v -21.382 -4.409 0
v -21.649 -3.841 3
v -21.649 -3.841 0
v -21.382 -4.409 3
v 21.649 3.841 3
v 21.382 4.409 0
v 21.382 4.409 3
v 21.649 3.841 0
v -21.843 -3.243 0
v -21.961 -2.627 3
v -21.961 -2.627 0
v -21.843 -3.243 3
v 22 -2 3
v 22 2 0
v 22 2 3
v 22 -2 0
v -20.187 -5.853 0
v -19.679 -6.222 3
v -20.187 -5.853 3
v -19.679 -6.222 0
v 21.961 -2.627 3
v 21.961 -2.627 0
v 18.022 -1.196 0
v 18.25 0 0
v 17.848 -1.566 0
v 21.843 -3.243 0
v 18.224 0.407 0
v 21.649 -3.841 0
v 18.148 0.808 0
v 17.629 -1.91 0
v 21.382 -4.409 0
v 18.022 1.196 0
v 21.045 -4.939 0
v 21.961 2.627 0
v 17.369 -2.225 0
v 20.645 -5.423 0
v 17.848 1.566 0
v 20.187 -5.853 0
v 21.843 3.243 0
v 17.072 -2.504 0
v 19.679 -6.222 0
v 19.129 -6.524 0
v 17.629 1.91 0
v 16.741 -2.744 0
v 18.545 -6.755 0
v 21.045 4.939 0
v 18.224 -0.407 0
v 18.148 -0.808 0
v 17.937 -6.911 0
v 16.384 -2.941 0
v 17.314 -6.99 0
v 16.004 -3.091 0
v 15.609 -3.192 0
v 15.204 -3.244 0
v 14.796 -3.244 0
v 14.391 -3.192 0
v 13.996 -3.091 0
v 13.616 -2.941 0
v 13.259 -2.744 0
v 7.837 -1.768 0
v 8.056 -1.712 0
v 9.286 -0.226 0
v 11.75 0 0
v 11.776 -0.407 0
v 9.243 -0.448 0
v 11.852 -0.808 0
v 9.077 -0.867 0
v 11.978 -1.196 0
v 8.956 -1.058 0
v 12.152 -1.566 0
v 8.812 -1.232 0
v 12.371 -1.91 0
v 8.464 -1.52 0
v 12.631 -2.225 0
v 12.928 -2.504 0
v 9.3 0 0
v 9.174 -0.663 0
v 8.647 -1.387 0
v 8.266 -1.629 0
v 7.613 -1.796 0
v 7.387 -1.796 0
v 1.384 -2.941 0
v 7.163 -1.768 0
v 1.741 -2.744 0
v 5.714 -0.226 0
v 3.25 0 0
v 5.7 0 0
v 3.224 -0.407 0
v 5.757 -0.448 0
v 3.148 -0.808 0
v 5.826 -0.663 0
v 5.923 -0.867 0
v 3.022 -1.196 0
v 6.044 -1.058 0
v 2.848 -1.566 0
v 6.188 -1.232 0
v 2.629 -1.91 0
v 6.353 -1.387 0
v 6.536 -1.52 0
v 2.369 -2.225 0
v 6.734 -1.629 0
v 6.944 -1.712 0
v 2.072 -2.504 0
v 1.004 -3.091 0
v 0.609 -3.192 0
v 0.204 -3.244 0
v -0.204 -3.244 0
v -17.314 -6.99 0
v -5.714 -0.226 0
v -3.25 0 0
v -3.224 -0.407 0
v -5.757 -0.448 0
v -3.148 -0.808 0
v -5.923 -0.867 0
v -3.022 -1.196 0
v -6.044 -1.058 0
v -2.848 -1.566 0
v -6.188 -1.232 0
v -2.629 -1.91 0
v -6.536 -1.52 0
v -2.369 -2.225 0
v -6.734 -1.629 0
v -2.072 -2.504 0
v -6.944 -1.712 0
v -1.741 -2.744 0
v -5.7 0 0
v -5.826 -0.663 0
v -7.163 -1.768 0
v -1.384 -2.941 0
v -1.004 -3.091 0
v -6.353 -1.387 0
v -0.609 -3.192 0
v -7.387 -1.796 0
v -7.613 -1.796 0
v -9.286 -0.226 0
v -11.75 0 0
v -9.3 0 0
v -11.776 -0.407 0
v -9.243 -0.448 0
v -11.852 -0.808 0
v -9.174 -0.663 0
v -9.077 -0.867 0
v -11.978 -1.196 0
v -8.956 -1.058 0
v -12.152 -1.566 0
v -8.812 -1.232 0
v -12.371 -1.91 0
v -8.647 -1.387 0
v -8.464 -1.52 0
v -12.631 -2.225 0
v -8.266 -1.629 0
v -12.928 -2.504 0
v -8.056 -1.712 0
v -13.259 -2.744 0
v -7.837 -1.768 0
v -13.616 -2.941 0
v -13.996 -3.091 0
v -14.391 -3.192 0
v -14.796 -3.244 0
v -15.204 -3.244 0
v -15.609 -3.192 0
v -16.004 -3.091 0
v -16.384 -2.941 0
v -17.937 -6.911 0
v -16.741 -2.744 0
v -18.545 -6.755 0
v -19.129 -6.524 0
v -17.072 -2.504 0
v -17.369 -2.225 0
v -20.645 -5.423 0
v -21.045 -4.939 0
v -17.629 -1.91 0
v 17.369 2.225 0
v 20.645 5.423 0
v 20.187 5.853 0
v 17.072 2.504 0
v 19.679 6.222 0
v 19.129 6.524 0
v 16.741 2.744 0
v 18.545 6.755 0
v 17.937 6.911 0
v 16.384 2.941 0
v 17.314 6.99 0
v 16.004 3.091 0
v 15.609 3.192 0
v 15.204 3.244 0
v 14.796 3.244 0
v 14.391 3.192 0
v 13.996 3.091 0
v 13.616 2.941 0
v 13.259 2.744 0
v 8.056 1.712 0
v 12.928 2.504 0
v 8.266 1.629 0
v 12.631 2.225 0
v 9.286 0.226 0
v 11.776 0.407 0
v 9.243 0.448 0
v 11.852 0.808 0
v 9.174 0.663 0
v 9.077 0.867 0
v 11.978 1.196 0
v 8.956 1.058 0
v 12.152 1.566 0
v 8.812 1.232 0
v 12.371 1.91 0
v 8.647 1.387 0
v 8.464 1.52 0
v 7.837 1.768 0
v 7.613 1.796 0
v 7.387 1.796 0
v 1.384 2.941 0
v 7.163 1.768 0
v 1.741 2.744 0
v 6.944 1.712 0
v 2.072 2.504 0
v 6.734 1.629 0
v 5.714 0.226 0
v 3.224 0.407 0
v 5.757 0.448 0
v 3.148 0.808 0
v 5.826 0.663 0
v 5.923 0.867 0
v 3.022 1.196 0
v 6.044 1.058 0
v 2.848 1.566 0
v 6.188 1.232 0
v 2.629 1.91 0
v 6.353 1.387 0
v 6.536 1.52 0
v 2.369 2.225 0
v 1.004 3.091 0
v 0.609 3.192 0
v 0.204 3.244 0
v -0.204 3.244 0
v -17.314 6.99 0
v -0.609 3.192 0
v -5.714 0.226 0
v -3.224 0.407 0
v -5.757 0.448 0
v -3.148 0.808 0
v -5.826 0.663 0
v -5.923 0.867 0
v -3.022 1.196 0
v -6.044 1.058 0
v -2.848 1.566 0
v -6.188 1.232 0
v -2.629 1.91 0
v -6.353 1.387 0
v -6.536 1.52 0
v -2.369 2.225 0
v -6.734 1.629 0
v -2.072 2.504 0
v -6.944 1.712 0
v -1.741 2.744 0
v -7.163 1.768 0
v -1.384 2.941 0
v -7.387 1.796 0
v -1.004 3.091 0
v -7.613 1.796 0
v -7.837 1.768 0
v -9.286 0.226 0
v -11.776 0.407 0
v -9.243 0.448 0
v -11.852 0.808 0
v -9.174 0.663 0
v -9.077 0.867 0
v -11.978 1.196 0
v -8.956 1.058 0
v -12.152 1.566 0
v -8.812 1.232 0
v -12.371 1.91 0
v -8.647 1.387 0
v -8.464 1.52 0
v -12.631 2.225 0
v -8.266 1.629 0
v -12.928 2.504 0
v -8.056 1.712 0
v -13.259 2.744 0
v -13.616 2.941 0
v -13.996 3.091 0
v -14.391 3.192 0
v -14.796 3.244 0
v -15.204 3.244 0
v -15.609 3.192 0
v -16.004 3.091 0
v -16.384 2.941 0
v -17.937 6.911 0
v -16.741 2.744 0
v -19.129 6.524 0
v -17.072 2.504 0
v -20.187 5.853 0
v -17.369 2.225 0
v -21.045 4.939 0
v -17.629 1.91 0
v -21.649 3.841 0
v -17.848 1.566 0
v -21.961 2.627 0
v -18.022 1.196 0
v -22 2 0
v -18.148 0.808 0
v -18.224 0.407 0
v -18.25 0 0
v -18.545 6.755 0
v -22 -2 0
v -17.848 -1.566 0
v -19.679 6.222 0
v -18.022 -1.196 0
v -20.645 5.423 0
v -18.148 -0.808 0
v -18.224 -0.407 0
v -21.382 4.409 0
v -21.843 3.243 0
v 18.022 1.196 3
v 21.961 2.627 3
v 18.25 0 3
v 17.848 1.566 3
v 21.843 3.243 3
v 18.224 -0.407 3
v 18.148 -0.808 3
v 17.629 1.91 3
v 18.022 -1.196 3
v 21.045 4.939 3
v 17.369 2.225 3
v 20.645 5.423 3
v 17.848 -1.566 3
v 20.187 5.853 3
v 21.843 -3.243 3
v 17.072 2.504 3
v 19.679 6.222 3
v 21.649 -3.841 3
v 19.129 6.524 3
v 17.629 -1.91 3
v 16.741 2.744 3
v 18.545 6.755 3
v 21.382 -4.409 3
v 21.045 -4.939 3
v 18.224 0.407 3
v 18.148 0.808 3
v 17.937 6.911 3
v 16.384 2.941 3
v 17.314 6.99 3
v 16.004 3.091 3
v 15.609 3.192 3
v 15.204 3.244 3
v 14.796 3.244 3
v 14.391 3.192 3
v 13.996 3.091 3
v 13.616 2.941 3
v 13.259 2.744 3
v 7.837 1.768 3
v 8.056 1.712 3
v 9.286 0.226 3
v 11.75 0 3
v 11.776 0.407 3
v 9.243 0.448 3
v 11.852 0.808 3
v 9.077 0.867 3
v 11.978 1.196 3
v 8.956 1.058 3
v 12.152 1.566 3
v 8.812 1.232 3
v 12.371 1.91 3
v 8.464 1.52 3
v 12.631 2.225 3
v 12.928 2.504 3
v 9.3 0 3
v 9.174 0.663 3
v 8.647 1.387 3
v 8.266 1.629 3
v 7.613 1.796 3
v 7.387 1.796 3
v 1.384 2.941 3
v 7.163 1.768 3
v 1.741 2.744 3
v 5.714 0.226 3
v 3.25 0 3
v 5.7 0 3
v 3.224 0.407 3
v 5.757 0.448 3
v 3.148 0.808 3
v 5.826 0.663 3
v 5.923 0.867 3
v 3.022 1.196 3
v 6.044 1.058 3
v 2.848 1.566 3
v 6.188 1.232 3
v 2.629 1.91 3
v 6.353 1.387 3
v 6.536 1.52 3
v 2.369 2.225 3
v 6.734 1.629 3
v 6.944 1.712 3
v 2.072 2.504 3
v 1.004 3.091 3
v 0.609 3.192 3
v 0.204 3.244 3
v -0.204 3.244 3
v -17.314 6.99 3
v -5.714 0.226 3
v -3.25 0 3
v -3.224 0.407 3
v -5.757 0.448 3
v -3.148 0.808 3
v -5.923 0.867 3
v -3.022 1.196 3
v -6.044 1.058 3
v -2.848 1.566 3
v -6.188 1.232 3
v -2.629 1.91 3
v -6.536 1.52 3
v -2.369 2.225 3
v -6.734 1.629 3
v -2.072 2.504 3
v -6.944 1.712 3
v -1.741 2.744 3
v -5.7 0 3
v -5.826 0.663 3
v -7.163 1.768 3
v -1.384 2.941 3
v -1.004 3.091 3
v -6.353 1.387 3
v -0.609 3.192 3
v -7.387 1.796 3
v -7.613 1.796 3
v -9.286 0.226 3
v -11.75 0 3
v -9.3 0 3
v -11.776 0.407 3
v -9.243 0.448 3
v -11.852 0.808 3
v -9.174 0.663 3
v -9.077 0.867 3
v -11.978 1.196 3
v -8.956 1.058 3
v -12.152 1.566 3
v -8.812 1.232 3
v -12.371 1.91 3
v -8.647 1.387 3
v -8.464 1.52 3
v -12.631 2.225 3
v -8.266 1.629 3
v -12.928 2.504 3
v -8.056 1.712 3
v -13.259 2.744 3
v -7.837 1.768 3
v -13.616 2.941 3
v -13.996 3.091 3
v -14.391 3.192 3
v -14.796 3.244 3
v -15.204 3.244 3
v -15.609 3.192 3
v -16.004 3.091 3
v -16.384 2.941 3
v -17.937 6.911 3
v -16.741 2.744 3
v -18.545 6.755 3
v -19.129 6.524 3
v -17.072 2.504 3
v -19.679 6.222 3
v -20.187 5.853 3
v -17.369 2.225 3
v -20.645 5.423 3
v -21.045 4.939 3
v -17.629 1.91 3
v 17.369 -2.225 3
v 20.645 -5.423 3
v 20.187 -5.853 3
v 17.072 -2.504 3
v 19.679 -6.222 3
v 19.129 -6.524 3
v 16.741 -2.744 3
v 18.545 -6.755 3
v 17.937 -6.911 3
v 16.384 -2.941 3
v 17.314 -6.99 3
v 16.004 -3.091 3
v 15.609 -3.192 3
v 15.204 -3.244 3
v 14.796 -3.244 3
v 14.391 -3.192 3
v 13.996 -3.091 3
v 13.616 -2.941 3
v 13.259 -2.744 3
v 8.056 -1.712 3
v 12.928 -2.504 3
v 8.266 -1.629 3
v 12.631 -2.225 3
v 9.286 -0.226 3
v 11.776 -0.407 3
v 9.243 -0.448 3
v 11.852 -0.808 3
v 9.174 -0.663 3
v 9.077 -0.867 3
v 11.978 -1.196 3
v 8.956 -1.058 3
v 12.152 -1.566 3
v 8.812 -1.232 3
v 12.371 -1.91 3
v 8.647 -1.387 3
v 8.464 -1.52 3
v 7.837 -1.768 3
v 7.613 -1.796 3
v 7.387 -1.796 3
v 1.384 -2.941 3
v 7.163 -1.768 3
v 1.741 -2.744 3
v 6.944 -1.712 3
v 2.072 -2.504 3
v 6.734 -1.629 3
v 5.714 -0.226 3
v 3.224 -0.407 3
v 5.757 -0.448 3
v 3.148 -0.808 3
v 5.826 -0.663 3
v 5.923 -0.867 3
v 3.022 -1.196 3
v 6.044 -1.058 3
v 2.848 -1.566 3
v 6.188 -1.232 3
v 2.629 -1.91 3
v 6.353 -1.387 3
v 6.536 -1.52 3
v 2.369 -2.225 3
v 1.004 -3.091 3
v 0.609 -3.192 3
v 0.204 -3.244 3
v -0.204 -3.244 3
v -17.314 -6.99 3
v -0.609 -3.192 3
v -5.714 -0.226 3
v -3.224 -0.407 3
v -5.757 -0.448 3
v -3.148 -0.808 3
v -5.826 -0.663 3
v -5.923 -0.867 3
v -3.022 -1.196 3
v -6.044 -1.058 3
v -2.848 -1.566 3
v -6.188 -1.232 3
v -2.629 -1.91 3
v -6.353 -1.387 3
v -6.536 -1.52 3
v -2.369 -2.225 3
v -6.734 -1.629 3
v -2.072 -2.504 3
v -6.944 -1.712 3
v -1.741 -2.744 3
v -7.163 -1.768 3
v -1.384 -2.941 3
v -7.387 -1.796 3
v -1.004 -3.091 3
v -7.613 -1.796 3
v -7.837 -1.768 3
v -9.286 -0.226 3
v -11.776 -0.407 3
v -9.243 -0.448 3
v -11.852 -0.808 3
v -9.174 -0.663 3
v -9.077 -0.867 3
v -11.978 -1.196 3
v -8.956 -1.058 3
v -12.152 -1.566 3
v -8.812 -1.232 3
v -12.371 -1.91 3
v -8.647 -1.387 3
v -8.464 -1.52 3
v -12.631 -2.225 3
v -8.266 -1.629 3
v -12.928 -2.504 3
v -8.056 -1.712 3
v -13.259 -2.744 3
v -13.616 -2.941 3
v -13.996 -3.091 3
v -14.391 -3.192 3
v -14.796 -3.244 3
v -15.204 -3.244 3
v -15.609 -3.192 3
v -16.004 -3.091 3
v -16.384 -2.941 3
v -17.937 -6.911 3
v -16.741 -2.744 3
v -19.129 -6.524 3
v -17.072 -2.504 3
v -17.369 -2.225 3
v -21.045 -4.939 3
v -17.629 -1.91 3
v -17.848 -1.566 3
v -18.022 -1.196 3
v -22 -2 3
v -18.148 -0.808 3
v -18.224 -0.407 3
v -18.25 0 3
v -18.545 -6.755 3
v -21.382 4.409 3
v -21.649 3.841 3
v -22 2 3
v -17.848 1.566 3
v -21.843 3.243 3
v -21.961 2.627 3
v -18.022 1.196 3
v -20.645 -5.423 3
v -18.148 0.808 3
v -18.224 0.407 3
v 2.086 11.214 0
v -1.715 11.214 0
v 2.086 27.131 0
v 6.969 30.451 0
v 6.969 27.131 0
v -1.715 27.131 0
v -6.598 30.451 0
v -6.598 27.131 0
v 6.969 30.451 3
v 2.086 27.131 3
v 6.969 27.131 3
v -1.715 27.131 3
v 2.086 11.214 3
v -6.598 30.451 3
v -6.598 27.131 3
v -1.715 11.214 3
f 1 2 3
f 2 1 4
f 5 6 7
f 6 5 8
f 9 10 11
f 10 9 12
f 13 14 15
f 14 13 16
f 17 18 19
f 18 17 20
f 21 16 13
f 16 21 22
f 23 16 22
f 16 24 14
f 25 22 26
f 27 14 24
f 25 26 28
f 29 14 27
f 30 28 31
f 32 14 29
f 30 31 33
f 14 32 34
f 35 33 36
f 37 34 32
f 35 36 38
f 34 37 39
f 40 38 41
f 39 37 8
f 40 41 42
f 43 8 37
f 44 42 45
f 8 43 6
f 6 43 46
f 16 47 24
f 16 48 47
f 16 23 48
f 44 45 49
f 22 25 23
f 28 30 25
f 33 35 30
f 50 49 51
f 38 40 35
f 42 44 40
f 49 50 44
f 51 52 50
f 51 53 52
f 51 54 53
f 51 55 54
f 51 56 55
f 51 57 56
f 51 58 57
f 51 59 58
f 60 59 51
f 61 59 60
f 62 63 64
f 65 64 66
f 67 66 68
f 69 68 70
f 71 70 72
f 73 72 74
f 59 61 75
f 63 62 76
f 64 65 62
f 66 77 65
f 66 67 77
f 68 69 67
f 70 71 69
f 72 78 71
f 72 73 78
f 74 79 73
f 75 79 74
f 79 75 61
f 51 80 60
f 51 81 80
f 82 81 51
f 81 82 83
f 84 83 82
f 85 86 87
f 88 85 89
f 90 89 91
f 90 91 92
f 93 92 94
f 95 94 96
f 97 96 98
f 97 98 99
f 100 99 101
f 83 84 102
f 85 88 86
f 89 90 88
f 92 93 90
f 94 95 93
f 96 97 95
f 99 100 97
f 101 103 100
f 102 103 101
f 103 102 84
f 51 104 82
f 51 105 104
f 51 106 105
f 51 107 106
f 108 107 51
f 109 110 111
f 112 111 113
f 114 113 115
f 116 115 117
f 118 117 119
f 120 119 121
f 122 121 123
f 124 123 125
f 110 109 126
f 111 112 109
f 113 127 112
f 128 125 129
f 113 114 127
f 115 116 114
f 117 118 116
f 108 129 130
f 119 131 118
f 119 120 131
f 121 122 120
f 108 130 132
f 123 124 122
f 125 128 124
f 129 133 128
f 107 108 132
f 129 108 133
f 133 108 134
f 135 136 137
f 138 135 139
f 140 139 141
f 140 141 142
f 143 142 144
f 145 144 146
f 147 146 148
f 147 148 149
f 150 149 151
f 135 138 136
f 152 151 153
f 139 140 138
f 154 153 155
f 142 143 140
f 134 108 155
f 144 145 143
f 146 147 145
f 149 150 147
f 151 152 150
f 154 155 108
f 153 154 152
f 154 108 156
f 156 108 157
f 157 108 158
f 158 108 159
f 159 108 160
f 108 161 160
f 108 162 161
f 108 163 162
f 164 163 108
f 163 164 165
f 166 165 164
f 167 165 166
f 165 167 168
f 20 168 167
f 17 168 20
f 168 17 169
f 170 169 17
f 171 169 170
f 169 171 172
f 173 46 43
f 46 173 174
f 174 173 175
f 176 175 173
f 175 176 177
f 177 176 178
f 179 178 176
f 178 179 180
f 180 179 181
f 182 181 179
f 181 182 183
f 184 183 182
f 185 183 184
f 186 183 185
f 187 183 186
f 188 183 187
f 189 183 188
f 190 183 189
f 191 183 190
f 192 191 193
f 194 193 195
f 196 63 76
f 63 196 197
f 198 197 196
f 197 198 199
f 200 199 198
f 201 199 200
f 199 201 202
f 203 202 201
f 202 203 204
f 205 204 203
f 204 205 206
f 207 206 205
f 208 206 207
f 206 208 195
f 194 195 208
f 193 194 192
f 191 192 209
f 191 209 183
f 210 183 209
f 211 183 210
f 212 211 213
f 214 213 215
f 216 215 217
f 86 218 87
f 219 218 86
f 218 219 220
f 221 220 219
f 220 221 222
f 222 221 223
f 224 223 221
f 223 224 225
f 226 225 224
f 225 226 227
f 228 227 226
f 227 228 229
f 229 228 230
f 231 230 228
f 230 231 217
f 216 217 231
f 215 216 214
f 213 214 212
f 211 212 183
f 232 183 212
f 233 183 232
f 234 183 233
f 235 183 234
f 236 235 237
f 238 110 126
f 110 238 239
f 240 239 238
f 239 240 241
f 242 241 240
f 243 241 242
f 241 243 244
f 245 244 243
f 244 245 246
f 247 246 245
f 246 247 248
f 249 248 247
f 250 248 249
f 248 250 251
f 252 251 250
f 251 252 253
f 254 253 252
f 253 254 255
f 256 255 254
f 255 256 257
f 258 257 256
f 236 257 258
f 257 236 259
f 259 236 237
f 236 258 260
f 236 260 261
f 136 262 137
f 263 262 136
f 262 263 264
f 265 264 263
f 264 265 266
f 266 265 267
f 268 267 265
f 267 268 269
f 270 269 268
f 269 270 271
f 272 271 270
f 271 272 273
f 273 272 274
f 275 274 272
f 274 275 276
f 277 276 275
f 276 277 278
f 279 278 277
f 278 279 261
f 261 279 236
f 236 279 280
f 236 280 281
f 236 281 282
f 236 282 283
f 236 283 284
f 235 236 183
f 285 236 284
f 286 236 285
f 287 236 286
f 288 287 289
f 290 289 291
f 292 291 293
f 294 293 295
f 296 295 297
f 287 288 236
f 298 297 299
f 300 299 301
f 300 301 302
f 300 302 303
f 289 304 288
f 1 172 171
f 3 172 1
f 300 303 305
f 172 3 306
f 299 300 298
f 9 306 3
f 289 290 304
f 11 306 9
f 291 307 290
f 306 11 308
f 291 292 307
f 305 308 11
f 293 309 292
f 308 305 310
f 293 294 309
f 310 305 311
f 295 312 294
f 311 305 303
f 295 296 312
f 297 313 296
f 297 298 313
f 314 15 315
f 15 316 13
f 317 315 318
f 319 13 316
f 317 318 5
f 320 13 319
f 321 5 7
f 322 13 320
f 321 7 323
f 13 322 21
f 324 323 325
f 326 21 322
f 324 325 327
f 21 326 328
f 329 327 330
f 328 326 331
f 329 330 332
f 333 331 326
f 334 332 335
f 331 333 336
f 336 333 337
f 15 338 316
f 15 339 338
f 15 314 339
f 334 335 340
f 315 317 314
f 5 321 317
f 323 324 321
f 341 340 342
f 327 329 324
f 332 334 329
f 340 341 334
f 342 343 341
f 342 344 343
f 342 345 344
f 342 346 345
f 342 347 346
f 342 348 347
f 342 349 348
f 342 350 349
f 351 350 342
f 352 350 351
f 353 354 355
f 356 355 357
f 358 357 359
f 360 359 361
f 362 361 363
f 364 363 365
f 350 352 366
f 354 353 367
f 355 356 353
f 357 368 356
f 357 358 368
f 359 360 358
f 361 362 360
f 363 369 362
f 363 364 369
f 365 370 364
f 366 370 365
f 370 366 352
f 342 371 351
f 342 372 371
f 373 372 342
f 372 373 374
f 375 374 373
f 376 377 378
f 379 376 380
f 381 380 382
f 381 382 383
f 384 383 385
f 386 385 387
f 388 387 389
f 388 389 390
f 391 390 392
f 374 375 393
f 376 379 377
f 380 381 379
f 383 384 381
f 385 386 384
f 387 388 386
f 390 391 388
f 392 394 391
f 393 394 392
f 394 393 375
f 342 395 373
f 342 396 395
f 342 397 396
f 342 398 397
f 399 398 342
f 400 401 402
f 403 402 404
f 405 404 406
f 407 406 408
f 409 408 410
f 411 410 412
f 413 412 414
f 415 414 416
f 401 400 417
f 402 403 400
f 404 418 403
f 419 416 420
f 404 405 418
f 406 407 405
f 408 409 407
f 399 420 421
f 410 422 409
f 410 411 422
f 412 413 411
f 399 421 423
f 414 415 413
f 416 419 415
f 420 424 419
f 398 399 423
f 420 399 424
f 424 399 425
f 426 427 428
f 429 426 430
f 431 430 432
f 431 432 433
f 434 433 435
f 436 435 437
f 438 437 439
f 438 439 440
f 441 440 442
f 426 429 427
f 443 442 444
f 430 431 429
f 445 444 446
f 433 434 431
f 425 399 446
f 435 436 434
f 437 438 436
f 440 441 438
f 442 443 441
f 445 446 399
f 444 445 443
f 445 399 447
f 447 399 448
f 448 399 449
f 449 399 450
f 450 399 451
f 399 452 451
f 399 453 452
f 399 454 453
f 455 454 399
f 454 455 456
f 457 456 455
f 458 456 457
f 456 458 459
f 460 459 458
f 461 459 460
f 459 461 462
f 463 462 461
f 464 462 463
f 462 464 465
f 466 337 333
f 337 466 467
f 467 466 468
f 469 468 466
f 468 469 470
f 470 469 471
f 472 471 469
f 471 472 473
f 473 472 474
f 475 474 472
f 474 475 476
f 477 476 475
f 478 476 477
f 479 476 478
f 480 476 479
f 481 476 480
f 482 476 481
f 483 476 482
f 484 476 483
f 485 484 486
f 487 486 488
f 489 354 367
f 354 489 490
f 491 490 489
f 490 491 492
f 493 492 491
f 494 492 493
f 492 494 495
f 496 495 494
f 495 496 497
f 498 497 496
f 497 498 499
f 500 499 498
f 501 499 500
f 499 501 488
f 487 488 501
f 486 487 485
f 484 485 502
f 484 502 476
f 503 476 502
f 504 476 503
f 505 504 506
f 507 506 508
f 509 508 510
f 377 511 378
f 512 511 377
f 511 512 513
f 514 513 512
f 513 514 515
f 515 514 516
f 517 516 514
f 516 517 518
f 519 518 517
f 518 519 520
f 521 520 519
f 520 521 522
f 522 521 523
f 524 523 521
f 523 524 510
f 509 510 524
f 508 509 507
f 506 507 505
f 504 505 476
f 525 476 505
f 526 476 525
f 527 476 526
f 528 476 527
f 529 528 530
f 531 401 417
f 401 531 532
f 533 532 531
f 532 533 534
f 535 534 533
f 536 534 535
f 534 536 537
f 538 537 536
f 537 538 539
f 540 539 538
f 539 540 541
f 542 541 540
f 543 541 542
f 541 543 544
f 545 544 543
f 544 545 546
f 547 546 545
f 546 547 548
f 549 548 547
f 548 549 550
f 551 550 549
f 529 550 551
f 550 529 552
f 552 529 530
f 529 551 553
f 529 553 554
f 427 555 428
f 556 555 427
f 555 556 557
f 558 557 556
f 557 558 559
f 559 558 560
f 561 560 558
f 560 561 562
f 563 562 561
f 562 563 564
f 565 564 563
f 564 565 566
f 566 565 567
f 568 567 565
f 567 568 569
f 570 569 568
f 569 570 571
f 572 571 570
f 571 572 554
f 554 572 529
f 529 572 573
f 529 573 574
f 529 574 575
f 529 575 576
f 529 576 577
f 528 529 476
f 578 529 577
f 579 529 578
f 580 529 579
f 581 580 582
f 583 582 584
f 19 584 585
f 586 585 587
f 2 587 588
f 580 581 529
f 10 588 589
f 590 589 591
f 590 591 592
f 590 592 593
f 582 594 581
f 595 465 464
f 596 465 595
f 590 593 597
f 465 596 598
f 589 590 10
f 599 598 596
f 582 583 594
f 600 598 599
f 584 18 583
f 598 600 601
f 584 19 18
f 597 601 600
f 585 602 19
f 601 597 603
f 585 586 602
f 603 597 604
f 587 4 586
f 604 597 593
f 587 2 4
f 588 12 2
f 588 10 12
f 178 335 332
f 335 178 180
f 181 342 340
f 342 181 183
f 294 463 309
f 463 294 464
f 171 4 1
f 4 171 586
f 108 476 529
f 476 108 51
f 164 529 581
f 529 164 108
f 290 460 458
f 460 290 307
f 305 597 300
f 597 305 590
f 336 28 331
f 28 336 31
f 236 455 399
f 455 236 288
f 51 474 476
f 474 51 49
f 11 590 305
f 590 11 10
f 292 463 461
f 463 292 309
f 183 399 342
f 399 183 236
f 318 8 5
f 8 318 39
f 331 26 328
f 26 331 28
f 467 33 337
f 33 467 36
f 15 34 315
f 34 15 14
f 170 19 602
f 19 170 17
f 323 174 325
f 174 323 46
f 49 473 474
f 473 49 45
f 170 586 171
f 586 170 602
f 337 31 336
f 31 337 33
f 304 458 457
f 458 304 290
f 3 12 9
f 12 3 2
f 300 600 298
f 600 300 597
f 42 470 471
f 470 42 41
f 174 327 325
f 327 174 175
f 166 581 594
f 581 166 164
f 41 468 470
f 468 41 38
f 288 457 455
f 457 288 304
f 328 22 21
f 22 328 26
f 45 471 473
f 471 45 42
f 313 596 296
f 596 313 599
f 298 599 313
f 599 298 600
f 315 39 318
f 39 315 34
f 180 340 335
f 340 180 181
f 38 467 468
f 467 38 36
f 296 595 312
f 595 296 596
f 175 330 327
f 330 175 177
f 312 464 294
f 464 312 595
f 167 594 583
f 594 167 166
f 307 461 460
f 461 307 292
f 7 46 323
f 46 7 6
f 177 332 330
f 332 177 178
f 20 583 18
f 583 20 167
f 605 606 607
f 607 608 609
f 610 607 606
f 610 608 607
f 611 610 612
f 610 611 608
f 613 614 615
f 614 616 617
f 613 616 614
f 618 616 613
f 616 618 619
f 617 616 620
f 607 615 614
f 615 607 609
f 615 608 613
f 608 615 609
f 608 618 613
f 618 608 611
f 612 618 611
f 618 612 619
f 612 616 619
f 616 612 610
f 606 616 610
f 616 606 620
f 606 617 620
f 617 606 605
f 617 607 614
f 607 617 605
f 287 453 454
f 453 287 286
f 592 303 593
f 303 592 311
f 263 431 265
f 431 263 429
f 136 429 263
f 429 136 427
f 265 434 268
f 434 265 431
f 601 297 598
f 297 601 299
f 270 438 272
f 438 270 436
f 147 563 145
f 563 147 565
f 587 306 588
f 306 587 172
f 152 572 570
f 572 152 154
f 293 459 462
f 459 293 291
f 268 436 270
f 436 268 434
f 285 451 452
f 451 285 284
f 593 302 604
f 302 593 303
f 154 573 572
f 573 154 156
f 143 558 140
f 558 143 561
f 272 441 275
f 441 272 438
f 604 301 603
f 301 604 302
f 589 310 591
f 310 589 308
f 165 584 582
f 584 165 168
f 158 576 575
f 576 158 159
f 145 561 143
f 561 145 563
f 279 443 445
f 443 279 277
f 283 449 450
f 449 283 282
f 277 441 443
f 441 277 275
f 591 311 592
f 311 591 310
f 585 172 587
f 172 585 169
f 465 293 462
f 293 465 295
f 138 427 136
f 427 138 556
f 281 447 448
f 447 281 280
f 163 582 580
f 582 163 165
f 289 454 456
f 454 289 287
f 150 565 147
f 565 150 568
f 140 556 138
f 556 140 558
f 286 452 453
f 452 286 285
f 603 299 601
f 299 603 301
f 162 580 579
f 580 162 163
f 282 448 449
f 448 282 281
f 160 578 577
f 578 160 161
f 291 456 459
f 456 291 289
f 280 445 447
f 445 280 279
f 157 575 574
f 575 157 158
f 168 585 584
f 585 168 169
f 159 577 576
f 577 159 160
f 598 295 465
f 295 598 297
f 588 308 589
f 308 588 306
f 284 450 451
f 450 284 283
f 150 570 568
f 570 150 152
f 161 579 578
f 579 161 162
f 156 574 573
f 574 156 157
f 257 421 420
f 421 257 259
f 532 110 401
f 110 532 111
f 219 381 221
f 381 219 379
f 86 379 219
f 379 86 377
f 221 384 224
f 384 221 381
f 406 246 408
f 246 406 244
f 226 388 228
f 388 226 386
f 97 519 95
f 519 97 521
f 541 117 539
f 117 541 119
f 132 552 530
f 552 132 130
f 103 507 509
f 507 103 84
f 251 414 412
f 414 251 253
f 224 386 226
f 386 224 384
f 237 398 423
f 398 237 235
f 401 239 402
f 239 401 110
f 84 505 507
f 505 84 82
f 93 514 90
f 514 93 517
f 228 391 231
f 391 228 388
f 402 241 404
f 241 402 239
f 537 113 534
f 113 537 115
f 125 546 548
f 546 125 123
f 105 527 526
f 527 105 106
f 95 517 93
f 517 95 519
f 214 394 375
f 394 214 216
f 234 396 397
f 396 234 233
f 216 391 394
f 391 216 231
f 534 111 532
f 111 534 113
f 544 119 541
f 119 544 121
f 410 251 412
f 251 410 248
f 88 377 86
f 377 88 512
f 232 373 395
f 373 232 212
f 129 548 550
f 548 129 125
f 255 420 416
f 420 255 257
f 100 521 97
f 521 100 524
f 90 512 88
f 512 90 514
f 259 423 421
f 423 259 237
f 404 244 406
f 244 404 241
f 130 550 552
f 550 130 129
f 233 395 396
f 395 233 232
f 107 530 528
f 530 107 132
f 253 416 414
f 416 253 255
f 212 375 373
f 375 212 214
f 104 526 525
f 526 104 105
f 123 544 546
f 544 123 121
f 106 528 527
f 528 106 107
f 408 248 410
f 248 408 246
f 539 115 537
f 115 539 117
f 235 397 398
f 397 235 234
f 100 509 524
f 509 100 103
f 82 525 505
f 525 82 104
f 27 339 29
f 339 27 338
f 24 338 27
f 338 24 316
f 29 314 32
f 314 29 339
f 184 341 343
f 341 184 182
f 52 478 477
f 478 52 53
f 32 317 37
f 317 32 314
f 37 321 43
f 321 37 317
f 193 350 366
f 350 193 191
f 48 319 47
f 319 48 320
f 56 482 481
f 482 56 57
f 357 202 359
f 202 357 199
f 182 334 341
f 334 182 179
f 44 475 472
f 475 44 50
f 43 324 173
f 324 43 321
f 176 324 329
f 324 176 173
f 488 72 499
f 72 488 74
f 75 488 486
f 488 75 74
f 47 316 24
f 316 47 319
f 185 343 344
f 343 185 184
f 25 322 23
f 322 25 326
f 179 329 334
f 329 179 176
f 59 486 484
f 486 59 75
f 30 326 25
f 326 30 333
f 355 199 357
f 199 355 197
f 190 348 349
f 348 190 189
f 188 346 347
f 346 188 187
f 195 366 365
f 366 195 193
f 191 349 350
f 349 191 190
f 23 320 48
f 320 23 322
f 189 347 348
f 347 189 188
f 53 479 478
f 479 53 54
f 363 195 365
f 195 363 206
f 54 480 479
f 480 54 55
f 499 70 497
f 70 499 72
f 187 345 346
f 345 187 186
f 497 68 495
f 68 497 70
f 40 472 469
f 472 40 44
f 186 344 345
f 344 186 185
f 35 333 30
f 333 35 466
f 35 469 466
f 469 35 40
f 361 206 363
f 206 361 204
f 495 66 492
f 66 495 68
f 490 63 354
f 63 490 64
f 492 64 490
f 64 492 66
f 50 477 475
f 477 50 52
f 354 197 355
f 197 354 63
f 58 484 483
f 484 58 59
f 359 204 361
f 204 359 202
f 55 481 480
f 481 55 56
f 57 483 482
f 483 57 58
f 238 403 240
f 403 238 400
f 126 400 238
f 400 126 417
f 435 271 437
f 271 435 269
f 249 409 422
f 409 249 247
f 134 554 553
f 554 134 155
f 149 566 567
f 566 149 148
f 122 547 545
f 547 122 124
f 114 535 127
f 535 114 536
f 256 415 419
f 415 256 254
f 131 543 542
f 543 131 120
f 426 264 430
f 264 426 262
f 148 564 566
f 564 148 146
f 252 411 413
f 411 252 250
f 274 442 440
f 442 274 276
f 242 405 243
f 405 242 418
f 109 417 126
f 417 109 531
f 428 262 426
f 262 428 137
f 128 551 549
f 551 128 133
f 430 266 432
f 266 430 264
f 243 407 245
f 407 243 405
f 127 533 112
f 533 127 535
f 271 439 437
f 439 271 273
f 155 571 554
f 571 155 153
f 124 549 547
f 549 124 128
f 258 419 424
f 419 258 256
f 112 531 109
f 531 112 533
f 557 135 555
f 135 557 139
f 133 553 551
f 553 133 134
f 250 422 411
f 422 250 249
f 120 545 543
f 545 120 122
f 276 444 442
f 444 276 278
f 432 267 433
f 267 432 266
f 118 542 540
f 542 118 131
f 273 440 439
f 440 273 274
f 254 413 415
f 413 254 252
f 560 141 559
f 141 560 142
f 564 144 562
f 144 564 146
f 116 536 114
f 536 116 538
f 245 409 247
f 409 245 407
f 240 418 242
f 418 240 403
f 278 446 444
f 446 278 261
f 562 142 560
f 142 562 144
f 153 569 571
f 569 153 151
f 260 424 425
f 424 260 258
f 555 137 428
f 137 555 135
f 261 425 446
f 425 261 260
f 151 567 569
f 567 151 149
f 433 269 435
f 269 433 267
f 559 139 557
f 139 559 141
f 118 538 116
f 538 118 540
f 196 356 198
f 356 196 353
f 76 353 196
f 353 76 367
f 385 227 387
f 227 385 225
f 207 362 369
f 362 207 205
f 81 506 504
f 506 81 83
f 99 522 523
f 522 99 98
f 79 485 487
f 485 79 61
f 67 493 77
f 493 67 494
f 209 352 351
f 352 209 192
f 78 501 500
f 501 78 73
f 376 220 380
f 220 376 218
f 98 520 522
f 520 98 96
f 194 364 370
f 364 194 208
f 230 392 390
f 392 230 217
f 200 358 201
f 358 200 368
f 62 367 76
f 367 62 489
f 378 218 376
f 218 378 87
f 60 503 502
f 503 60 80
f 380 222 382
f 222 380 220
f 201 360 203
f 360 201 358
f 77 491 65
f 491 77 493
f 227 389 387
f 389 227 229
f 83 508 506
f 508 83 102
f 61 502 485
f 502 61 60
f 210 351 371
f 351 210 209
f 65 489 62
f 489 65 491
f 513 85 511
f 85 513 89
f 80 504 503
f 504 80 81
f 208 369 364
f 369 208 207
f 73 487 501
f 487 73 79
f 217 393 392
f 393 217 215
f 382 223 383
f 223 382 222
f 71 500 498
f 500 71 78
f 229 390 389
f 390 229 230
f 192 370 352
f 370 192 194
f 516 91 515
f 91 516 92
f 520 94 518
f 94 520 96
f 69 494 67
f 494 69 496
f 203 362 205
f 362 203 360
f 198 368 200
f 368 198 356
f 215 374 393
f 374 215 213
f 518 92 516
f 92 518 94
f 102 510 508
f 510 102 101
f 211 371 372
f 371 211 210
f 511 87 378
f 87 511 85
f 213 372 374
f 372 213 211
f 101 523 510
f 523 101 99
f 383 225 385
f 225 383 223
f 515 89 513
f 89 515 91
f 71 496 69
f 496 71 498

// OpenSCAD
$fn = 50;


difference() {
	union() {
		hull() {
			translate(v = [-17.0000000000, 2.0000000000, 0]) {
				cylinder(h = 3, r = 5);
			}
			translate(v = [17.0000000000, 2.0000000000, 0]) {
				cylinder(h = 3, r = 5);
			}
			translate(v = [-17.0000000000, -2.0000000000, 0]) {
				cylinder(h = 3, r = 5);
			}
			translate(v = [17.0000000000, -2.0000000000, 0]) {
				cylinder(h = 3, r = 5);
			}
		}
		translate(v = [0, 30.0000000000, 0]) {
			linear_extrude(height = 3) {
				text(font = "DejaVu Sans Mono:style=Bold", halign = "center", size = 19.0000000000, text = "T", valign = "top");
			}
		}
	}
	union() {
		translate(v = [-15.0000000000, 0.0000000000, 0]) {
			translate(v = [0, 0, -100]) {
				cylinder(h = 200, r = 3.2500000000);
			}
		}
		translate(v = [0, 0, -100]) {
			cylinder(h = 200, r = 3.2500000000);
		}
		translate(v = [15.0000000000, 0.0000000000, 0]) {
			translate(v = [0, 0, -100]) {
				cylinder(h = 200, r = 3.2500000000);
			}
		}
		translate(v = [-15.0000000000, 0.0000000000, 0]) {
			translate(v = [0, 0, -100]) {
				cylinder(h = 200, r = 1.8000000000);
			}
		}
		translate(v = [-7.5000000000, 0.0000000000, 0]) {
			translate(v = [0, 0, -100]) {
				cylinder(h = 200, r = 1.8000000000);
			}
		}
		translate(v = [0, 0, -100]) {
			cylinder(h = 200, r = 1.8000000000);
		}
		translate(v = [7.5000000000, 0.0000000000, 0]) {
			translate(v = [0, 0, -100]) {
				cylinder(h = 200, r = 1.8000000000);
			}
		}
		translate(v = [15.0000000000, 0.0000000000, 0]) {
			translate(v = [0, 0, -100]) {
				cylinder(h = 200, r = 1.8000000000);
			}
		}
	}
}
